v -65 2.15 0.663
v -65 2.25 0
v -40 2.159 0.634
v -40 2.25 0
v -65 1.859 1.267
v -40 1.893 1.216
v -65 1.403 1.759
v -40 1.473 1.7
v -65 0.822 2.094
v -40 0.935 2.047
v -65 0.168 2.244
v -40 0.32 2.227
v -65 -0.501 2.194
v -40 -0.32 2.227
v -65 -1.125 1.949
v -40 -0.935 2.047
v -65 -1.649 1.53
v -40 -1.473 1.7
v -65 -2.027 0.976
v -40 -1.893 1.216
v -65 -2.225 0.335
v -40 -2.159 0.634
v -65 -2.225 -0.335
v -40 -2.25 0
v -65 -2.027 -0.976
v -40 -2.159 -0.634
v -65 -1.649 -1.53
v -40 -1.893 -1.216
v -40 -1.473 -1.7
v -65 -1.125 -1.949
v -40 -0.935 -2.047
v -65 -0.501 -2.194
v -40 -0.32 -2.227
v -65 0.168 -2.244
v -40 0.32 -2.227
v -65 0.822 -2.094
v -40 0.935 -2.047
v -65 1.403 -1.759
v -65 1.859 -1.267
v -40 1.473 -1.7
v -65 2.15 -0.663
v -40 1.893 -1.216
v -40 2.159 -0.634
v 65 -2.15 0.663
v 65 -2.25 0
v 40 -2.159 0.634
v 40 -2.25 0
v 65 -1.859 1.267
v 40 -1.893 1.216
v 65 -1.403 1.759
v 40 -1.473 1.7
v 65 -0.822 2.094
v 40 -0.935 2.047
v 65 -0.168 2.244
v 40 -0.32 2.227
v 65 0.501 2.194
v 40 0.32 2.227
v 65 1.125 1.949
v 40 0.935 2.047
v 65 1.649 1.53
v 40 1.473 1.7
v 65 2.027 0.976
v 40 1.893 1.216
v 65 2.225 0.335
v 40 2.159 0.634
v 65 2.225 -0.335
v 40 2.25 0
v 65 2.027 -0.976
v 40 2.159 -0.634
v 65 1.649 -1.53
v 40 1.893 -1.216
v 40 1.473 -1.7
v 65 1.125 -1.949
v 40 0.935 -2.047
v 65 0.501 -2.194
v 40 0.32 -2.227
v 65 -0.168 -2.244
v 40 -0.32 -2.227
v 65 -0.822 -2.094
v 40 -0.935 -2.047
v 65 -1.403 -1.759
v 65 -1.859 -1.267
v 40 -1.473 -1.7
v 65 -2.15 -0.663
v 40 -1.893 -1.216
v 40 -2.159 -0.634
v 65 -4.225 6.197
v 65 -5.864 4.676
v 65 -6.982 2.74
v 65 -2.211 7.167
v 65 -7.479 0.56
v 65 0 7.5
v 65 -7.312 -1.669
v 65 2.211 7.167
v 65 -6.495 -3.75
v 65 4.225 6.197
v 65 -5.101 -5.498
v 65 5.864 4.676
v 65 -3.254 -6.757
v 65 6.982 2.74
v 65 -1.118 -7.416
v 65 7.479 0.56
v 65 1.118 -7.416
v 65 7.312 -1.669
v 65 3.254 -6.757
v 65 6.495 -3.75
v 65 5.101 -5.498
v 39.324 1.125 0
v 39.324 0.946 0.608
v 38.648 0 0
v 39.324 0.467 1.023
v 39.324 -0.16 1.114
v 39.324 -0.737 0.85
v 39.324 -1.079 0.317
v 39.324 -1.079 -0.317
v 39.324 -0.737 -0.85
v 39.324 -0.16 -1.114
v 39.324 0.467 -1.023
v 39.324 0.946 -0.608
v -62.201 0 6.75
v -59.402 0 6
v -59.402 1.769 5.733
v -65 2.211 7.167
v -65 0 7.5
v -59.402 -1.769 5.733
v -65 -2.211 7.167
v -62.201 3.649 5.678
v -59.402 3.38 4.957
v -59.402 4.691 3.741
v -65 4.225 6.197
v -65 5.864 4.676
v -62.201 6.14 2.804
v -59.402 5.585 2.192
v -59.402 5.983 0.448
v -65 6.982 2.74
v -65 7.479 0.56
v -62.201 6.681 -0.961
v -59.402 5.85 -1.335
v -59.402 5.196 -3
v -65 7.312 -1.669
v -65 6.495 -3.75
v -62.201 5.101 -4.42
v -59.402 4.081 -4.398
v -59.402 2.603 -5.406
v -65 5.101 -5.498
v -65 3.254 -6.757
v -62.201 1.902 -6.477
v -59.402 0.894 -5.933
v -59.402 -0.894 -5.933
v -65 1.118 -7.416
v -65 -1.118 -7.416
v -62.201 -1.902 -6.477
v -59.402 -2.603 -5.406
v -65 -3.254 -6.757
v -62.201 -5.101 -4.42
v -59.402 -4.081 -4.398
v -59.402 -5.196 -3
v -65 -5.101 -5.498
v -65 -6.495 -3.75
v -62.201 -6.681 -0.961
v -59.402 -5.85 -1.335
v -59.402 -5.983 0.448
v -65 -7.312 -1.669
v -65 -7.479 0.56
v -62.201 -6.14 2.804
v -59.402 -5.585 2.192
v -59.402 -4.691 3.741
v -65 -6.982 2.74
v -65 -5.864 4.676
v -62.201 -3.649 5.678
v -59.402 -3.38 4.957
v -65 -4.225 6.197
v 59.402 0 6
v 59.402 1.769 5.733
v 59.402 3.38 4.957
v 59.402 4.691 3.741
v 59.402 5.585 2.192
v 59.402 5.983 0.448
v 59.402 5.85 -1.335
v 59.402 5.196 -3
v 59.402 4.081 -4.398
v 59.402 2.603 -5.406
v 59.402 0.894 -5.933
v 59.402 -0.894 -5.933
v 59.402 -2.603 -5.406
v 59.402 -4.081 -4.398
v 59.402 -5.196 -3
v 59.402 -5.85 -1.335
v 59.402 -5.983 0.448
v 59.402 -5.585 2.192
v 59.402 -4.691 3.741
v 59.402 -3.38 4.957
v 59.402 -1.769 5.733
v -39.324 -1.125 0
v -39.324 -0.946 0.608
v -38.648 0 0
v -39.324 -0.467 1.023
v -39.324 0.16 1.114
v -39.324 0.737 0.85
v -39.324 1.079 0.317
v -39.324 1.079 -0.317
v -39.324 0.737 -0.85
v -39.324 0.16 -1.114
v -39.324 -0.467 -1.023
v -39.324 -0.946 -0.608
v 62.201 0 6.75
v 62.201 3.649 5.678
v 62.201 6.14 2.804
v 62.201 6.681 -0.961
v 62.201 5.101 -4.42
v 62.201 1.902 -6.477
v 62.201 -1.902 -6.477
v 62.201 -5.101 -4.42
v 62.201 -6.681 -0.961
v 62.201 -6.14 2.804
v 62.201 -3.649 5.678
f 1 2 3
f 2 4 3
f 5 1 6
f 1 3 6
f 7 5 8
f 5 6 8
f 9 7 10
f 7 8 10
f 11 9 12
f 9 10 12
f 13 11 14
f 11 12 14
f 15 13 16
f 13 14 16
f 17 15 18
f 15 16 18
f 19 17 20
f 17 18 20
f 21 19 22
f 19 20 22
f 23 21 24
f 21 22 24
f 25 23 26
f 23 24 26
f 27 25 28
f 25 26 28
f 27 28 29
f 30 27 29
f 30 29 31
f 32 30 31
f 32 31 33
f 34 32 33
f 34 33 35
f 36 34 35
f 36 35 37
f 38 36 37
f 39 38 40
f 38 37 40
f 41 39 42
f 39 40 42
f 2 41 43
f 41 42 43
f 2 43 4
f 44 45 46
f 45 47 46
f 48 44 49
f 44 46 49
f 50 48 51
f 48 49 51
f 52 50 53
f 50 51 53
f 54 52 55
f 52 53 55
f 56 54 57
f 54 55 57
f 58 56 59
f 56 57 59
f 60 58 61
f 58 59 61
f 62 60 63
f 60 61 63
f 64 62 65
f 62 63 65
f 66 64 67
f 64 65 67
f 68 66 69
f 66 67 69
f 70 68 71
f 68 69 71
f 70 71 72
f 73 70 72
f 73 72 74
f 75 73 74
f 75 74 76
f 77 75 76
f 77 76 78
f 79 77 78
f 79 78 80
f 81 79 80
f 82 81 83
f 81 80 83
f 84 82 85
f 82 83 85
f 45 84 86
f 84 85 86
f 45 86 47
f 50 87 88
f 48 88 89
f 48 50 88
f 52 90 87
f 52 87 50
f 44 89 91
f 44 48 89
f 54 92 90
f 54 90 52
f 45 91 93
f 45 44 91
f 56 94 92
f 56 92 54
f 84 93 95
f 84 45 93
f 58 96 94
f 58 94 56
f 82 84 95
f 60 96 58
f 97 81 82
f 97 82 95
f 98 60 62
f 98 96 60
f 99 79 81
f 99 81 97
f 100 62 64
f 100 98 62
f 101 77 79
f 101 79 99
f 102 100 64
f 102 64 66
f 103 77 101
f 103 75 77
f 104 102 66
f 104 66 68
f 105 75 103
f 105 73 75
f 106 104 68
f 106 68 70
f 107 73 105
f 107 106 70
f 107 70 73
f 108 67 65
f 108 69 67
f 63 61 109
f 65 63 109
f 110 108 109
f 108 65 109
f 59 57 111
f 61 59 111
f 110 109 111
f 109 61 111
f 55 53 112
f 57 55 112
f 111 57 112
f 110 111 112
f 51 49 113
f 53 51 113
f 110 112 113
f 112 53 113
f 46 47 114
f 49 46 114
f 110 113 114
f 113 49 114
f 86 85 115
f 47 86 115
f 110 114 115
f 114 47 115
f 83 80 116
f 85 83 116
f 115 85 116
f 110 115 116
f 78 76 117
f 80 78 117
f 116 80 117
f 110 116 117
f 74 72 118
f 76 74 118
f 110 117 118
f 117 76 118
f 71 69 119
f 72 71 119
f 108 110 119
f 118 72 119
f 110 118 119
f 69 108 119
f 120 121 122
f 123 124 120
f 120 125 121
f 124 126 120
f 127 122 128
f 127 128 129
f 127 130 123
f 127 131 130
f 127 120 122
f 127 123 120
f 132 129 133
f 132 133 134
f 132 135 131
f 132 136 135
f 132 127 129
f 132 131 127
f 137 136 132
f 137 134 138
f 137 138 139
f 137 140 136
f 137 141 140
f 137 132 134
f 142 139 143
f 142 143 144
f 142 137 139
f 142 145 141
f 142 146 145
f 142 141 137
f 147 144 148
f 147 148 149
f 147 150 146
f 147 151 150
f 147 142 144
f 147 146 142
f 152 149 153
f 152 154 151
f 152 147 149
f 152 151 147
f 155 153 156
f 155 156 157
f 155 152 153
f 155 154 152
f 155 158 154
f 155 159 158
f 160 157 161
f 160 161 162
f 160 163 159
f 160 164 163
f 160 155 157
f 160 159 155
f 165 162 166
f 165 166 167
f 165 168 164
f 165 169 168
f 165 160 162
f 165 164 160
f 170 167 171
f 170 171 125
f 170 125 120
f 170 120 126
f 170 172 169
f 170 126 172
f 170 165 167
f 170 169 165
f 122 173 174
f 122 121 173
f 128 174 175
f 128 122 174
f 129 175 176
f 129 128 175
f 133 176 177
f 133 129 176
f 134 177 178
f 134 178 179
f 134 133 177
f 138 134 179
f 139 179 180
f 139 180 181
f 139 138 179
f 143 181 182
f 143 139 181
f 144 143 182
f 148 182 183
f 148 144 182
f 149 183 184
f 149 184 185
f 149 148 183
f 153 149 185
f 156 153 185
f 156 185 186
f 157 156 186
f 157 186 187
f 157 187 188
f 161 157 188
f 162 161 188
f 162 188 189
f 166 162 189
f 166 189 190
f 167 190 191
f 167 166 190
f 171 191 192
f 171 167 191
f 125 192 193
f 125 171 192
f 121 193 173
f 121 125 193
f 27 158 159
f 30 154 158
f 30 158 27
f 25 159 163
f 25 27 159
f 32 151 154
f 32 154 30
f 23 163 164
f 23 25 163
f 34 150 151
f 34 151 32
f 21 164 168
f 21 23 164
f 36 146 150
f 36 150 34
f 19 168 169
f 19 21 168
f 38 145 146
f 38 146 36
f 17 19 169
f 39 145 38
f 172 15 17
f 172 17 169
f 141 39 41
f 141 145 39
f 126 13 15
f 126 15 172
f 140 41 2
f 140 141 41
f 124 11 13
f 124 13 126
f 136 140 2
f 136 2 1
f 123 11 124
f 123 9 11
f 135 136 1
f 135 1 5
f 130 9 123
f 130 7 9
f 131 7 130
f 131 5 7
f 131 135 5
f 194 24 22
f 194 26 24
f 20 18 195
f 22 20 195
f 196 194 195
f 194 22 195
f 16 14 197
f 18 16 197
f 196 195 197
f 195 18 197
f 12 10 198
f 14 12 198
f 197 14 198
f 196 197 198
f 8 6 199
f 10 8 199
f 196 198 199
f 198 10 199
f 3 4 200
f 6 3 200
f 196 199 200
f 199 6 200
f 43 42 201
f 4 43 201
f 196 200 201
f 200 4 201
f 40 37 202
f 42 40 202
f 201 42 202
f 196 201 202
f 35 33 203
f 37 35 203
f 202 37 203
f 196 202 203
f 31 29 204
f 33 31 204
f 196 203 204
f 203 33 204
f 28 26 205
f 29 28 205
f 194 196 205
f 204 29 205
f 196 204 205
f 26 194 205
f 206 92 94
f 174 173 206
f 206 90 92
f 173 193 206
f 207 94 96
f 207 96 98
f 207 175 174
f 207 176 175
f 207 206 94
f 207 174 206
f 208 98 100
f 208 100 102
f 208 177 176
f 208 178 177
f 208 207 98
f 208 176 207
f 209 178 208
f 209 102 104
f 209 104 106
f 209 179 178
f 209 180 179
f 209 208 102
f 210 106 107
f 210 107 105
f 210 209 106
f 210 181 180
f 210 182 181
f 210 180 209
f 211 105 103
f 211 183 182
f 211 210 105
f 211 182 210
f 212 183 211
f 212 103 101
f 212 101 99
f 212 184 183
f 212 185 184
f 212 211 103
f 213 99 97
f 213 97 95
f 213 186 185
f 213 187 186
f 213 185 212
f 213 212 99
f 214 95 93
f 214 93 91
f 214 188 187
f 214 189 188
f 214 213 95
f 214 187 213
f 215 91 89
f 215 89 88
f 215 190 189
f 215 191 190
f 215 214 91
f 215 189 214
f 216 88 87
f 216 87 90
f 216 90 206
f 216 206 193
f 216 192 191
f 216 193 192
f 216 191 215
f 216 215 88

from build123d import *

# Parameters (mm, degrees)
F4_D           = 4.5
F4_DEPTH       = 25
F4_TIP         = 1.3519363928
F4_ON_F3_D     = 4.5
F4_ON_F3_DEPTH = 25
F4_ON_F3_TIP   = 1.3519363928


with BuildPart() as f1:
    # F0 (on Front) → F1 (revolve)
    with BuildSketch(Plane.XZ):
        Polygon((-65, 7.5), (-65, 0), (65, 0), (65, 7.5), (59.4019237886, 6), (-59.4019237886, 6), align=None)
    revolve(axis=Axis((0, 0, 0), (-1, 0, 0)))

    # F4
    with Locations(Plane(origin=(-65, 0, 0), x_dir=(0, -1, 0), z_dir=(-1, 0, 0))):
        with Locations((0, 0)):
            Hole(F4_D / 2, depth=F4_DEPTH)
            with Locations((0, 0, -(F4_DEPTH + F4_TIP / 2))):  # 118° drill point
                Cone(0, F4_D / 2, F4_TIP, mode=Mode.SUBTRACT)

    # F4 on F3
    with Locations(Plane.YZ.offset(65)):
        with Locations((0, 0)):
            Hole(F4_ON_F3_D / 2, depth=F4_ON_F3_DEPTH)
            with Locations((0, 0, -(F4_ON_F3_DEPTH + F4_ON_F3_TIP / 2))):  # 118° drill point
                Cone(0, F4_ON_F3_D / 2, F4_ON_F3_TIP, mode=Mode.SUBTRACT)


solid = f1.part
